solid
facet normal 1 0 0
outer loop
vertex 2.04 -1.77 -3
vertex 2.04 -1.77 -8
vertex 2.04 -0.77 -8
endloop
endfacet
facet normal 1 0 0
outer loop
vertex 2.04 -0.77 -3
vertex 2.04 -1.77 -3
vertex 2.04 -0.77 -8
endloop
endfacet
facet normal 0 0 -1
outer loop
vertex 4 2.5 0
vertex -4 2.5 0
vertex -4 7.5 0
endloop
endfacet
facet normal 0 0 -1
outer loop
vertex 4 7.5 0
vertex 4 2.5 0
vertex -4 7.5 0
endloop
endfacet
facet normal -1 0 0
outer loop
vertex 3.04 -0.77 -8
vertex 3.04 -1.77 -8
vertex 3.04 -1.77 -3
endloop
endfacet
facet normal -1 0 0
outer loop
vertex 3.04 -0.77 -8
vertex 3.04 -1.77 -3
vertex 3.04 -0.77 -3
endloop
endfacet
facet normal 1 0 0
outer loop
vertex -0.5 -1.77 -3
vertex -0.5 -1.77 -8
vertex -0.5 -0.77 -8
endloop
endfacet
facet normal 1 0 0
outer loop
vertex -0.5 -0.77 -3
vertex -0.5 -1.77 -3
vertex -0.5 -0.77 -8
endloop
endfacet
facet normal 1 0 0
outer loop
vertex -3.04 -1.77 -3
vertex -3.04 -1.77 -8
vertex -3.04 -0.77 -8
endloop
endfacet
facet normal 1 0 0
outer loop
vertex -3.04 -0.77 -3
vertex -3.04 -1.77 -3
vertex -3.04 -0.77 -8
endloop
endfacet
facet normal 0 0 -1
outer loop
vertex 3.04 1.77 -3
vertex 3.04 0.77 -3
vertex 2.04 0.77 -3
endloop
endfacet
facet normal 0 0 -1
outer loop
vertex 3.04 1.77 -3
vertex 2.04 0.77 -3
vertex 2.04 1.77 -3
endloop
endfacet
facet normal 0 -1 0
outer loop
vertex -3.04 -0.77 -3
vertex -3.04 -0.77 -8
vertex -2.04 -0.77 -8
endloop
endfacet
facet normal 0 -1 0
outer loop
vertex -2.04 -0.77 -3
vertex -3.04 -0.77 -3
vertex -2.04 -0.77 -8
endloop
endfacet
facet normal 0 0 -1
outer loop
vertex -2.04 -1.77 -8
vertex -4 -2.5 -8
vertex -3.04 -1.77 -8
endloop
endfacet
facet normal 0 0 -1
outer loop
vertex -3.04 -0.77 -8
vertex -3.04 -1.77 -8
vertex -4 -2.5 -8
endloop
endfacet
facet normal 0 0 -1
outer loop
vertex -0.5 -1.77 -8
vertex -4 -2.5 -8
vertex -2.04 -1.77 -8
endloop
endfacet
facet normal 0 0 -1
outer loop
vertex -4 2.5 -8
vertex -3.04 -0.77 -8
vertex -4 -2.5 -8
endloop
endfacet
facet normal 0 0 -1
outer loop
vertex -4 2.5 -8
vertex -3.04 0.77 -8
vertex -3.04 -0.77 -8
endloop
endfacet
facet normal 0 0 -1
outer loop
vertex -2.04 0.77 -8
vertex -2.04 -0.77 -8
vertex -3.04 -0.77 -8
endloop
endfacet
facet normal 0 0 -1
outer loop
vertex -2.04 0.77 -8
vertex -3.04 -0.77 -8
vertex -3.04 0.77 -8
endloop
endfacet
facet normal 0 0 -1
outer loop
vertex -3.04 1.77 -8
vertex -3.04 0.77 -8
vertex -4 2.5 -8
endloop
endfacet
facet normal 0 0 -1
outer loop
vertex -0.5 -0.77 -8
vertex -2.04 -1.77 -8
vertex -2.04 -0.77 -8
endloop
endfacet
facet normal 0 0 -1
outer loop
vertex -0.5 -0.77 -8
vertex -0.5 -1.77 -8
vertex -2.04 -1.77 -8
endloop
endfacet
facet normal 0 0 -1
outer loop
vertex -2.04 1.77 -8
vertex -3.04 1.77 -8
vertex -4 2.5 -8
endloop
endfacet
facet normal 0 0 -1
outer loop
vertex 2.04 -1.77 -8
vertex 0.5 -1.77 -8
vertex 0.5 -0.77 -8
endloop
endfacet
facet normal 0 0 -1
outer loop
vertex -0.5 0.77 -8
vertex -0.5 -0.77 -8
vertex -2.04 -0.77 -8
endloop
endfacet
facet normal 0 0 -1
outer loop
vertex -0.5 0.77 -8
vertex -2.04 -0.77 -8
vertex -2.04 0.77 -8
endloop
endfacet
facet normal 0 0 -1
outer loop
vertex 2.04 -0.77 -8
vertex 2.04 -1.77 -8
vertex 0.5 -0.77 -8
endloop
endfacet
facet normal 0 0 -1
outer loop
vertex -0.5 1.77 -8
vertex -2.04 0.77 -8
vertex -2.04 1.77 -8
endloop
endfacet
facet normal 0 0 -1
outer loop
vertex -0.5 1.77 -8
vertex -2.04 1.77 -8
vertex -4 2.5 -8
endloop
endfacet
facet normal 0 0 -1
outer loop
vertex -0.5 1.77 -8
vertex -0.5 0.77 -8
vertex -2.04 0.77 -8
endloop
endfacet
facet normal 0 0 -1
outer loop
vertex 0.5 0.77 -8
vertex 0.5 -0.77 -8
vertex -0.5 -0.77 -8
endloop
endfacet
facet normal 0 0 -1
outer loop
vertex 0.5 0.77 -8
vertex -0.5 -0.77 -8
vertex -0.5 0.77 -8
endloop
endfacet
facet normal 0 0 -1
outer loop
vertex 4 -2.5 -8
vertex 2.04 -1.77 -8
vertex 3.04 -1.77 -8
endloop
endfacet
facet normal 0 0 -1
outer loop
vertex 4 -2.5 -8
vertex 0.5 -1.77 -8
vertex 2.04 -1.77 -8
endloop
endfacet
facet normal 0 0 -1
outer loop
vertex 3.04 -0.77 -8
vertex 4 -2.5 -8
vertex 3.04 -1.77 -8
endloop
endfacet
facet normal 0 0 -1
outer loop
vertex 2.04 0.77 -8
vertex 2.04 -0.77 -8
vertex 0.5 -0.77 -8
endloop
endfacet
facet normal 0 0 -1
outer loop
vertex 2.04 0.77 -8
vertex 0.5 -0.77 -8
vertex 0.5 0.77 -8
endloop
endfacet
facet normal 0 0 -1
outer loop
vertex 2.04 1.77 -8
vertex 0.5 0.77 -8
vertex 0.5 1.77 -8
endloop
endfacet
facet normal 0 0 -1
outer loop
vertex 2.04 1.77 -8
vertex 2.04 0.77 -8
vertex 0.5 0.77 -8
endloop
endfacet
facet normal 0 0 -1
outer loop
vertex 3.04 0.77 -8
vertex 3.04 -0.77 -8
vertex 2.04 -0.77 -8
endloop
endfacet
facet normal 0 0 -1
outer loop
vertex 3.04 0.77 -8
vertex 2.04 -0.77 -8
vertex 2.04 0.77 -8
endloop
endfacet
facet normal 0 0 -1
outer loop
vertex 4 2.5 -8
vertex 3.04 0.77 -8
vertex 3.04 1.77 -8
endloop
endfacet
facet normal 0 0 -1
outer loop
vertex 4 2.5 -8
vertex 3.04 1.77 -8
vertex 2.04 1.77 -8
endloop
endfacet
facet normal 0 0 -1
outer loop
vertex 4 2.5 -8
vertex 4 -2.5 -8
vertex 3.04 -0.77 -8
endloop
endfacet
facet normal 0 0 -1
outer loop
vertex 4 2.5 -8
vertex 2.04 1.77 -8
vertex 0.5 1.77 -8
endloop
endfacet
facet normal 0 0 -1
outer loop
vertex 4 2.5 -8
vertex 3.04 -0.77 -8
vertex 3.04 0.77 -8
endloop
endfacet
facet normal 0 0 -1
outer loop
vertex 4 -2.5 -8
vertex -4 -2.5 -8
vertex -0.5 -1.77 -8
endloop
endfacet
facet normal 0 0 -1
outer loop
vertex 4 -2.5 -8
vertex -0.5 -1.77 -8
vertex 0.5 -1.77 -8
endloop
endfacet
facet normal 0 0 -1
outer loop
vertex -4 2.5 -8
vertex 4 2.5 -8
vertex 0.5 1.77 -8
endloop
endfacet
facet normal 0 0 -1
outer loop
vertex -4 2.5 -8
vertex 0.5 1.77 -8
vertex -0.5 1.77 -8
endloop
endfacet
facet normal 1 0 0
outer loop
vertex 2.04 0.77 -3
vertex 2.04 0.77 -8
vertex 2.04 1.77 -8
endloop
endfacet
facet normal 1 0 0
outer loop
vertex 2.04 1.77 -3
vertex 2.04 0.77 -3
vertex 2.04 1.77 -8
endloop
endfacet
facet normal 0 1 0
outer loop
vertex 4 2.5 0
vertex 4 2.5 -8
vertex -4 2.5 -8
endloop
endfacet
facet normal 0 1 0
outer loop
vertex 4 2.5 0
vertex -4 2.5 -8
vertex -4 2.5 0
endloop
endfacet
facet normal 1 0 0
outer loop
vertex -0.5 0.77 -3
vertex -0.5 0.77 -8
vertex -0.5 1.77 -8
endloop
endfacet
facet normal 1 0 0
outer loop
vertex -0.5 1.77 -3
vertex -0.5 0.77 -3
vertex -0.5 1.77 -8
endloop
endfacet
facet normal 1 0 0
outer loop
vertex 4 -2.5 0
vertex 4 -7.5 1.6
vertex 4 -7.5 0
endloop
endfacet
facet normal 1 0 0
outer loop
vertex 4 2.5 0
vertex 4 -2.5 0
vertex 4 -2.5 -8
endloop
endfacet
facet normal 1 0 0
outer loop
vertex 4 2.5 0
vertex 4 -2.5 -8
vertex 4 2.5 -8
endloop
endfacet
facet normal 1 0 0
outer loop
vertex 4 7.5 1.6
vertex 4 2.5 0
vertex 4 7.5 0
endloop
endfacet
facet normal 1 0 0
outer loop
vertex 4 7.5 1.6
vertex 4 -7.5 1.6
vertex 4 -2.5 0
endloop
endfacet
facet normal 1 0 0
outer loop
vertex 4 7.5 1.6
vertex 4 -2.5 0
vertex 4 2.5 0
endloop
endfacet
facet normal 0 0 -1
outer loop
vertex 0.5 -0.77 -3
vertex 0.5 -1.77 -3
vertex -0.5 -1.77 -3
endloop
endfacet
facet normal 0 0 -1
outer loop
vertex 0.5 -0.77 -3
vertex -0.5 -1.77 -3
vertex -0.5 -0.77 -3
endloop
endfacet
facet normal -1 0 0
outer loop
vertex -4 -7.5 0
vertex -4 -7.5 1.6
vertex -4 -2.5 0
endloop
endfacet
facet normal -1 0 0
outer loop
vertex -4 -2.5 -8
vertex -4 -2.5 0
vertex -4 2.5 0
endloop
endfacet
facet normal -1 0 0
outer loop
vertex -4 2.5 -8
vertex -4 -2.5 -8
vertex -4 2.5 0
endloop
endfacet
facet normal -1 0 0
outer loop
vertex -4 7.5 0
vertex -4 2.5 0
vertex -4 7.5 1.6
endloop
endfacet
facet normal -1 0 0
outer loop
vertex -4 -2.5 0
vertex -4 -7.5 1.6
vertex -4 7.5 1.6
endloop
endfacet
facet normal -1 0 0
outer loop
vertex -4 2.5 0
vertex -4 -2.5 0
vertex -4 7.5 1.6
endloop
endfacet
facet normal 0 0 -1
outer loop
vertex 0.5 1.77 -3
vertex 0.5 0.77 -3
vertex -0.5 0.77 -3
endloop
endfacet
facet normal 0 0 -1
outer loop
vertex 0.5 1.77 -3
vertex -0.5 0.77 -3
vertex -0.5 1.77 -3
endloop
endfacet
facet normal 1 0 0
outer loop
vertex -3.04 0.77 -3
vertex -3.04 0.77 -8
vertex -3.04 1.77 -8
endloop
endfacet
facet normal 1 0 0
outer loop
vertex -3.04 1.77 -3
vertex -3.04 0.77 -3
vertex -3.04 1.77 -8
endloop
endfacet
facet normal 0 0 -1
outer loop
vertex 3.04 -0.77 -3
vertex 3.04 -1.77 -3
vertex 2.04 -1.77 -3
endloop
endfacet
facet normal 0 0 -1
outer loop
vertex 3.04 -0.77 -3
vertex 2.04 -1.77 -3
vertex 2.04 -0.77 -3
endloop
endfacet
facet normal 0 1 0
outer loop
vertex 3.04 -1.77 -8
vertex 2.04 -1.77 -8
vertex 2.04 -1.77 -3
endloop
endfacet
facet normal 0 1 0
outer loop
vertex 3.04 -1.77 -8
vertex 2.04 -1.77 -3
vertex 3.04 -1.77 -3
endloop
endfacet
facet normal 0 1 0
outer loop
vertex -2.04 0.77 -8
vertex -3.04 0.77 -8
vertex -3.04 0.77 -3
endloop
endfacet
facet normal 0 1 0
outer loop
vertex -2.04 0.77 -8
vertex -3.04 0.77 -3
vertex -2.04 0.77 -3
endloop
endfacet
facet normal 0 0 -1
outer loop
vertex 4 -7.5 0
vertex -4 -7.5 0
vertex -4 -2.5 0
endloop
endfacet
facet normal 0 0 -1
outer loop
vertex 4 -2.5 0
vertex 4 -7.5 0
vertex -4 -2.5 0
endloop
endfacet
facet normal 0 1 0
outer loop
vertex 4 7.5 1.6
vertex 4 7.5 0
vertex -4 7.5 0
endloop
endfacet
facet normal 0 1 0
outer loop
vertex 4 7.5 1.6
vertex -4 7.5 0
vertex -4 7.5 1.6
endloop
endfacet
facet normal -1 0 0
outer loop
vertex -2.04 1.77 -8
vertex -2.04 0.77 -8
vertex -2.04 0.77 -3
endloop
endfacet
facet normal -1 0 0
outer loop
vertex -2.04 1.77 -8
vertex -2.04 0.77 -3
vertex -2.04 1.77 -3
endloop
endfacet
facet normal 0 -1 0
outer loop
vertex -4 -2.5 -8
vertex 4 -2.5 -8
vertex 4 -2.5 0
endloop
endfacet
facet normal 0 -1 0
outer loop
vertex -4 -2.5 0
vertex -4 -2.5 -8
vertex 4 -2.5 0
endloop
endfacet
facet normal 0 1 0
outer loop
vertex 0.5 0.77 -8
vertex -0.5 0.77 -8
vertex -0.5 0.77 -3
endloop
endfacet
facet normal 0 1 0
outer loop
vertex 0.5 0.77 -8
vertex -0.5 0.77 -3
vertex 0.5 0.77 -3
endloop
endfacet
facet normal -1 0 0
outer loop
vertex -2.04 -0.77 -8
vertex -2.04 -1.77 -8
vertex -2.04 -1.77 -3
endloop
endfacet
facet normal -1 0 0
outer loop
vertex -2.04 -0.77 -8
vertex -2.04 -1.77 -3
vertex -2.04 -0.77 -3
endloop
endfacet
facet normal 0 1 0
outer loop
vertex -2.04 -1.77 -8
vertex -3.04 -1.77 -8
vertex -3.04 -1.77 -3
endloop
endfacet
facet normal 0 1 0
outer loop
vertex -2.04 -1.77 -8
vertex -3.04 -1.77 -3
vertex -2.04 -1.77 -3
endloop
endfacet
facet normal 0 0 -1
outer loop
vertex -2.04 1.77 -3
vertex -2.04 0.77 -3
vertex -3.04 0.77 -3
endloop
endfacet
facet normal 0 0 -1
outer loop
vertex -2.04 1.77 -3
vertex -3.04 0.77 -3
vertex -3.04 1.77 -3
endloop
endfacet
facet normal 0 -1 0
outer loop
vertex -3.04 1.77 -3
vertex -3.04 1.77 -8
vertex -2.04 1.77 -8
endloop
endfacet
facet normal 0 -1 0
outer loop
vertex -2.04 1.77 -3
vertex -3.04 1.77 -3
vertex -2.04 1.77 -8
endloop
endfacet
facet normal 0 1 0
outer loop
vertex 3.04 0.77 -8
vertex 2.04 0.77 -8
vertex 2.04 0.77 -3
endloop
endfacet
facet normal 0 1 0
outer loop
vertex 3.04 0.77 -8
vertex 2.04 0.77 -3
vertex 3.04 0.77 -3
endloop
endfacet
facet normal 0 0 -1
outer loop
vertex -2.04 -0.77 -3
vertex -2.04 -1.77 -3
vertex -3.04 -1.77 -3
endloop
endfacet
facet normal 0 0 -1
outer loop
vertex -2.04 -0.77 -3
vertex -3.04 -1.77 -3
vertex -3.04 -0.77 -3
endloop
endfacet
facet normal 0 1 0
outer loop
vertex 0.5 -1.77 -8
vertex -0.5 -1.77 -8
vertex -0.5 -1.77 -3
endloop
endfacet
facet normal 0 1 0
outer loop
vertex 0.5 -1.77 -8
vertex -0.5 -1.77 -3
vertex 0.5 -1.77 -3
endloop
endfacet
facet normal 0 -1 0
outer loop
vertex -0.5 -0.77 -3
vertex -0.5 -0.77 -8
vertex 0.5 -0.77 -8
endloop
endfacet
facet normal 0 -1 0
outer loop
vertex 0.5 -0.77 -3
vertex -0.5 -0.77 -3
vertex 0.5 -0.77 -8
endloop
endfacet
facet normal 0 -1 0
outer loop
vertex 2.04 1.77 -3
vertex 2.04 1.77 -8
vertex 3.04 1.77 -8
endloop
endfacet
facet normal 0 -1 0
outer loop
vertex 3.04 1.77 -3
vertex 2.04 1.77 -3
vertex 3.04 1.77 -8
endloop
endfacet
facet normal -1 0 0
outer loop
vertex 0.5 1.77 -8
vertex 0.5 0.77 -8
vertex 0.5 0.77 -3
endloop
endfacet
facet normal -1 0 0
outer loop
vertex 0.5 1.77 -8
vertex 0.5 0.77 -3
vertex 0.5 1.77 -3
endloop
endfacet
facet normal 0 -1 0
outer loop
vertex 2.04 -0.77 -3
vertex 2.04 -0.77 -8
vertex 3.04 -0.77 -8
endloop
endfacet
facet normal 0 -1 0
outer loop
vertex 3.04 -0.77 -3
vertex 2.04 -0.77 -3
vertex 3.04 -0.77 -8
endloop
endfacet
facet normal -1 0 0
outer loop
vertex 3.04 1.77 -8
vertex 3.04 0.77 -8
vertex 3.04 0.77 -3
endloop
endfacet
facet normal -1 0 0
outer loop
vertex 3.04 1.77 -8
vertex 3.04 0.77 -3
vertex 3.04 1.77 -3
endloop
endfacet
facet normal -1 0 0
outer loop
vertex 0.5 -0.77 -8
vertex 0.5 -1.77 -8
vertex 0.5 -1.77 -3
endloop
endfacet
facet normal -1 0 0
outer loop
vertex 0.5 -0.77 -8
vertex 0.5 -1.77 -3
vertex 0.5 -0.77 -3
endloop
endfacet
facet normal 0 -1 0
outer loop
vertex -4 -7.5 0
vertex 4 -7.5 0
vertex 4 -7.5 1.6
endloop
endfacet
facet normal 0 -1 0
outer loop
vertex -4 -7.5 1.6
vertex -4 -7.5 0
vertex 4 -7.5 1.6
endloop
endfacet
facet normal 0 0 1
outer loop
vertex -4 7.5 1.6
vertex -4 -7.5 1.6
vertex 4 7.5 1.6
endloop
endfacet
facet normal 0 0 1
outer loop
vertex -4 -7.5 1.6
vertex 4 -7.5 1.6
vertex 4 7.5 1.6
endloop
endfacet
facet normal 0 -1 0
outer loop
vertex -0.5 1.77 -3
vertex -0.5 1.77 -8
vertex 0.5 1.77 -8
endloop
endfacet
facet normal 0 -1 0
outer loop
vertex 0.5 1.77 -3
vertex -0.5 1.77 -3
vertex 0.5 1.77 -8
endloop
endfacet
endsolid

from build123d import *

# Parameters (mm, degrees)
SKETCH002_W  = 15
SKETCH002_H  = 1.6
PAD001_DEPTH = 4
SKETCH_W     = 5
SKETCH_H     = 8
PAD_DEPTH    = 4
SKETCH001_W  = 1
SKETCH001_H  = 1
POCKET_DEPTH = 5


with BuildPart() as pad001:
    # Sketch002 → Pad001 (new body, symmetric)
    with BuildSketch(Plane.YZ):
        with Locations((0, 0.8)):
            Rectangle(SKETCH002_W, SKETCH002_H)
    extrude(amount=PAD001_DEPTH, both=True)


with BuildPart() as fusion:
    # Sketch → Pad (new body, symmetric)
    with BuildSketch(Plane.YZ):
        with Locations((0, -4)):
            Rectangle(SKETCH_W, SKETCH_H)
    extrude(amount=PAD_DEPTH, both=True)

    # Sketch001 → Pocket (cut)
    with BuildSketch(Plane.YX.offset(8)):
        with Locations((-1.27, 2.54)):
            Rectangle(SKETCH001_W, SKETCH001_H)
        with Locations((1.27, 2.54)):
            Rectangle(SKETCH001_W, SKETCH001_H)
        with Locations((-1.27, 0)):
            Rectangle(SKETCH001_W, SKETCH001_H)
        with Locations((1.27, 0)):
            Rectangle(SKETCH001_W, SKETCH001_H)
        with Locations((-1.27, -2.54)):
            Rectangle(SKETCH001_W, SKETCH001_H)
        with Locations((1.27, -2.54)):
            Rectangle(SKETCH001_W, SKETCH001_H)
    extrude(amount=-POCKET_DEPTH, mode=Mode.SUBTRACT)

    # Fusion: union Pad001
    add(pad001.part)


solid = fusion.part
